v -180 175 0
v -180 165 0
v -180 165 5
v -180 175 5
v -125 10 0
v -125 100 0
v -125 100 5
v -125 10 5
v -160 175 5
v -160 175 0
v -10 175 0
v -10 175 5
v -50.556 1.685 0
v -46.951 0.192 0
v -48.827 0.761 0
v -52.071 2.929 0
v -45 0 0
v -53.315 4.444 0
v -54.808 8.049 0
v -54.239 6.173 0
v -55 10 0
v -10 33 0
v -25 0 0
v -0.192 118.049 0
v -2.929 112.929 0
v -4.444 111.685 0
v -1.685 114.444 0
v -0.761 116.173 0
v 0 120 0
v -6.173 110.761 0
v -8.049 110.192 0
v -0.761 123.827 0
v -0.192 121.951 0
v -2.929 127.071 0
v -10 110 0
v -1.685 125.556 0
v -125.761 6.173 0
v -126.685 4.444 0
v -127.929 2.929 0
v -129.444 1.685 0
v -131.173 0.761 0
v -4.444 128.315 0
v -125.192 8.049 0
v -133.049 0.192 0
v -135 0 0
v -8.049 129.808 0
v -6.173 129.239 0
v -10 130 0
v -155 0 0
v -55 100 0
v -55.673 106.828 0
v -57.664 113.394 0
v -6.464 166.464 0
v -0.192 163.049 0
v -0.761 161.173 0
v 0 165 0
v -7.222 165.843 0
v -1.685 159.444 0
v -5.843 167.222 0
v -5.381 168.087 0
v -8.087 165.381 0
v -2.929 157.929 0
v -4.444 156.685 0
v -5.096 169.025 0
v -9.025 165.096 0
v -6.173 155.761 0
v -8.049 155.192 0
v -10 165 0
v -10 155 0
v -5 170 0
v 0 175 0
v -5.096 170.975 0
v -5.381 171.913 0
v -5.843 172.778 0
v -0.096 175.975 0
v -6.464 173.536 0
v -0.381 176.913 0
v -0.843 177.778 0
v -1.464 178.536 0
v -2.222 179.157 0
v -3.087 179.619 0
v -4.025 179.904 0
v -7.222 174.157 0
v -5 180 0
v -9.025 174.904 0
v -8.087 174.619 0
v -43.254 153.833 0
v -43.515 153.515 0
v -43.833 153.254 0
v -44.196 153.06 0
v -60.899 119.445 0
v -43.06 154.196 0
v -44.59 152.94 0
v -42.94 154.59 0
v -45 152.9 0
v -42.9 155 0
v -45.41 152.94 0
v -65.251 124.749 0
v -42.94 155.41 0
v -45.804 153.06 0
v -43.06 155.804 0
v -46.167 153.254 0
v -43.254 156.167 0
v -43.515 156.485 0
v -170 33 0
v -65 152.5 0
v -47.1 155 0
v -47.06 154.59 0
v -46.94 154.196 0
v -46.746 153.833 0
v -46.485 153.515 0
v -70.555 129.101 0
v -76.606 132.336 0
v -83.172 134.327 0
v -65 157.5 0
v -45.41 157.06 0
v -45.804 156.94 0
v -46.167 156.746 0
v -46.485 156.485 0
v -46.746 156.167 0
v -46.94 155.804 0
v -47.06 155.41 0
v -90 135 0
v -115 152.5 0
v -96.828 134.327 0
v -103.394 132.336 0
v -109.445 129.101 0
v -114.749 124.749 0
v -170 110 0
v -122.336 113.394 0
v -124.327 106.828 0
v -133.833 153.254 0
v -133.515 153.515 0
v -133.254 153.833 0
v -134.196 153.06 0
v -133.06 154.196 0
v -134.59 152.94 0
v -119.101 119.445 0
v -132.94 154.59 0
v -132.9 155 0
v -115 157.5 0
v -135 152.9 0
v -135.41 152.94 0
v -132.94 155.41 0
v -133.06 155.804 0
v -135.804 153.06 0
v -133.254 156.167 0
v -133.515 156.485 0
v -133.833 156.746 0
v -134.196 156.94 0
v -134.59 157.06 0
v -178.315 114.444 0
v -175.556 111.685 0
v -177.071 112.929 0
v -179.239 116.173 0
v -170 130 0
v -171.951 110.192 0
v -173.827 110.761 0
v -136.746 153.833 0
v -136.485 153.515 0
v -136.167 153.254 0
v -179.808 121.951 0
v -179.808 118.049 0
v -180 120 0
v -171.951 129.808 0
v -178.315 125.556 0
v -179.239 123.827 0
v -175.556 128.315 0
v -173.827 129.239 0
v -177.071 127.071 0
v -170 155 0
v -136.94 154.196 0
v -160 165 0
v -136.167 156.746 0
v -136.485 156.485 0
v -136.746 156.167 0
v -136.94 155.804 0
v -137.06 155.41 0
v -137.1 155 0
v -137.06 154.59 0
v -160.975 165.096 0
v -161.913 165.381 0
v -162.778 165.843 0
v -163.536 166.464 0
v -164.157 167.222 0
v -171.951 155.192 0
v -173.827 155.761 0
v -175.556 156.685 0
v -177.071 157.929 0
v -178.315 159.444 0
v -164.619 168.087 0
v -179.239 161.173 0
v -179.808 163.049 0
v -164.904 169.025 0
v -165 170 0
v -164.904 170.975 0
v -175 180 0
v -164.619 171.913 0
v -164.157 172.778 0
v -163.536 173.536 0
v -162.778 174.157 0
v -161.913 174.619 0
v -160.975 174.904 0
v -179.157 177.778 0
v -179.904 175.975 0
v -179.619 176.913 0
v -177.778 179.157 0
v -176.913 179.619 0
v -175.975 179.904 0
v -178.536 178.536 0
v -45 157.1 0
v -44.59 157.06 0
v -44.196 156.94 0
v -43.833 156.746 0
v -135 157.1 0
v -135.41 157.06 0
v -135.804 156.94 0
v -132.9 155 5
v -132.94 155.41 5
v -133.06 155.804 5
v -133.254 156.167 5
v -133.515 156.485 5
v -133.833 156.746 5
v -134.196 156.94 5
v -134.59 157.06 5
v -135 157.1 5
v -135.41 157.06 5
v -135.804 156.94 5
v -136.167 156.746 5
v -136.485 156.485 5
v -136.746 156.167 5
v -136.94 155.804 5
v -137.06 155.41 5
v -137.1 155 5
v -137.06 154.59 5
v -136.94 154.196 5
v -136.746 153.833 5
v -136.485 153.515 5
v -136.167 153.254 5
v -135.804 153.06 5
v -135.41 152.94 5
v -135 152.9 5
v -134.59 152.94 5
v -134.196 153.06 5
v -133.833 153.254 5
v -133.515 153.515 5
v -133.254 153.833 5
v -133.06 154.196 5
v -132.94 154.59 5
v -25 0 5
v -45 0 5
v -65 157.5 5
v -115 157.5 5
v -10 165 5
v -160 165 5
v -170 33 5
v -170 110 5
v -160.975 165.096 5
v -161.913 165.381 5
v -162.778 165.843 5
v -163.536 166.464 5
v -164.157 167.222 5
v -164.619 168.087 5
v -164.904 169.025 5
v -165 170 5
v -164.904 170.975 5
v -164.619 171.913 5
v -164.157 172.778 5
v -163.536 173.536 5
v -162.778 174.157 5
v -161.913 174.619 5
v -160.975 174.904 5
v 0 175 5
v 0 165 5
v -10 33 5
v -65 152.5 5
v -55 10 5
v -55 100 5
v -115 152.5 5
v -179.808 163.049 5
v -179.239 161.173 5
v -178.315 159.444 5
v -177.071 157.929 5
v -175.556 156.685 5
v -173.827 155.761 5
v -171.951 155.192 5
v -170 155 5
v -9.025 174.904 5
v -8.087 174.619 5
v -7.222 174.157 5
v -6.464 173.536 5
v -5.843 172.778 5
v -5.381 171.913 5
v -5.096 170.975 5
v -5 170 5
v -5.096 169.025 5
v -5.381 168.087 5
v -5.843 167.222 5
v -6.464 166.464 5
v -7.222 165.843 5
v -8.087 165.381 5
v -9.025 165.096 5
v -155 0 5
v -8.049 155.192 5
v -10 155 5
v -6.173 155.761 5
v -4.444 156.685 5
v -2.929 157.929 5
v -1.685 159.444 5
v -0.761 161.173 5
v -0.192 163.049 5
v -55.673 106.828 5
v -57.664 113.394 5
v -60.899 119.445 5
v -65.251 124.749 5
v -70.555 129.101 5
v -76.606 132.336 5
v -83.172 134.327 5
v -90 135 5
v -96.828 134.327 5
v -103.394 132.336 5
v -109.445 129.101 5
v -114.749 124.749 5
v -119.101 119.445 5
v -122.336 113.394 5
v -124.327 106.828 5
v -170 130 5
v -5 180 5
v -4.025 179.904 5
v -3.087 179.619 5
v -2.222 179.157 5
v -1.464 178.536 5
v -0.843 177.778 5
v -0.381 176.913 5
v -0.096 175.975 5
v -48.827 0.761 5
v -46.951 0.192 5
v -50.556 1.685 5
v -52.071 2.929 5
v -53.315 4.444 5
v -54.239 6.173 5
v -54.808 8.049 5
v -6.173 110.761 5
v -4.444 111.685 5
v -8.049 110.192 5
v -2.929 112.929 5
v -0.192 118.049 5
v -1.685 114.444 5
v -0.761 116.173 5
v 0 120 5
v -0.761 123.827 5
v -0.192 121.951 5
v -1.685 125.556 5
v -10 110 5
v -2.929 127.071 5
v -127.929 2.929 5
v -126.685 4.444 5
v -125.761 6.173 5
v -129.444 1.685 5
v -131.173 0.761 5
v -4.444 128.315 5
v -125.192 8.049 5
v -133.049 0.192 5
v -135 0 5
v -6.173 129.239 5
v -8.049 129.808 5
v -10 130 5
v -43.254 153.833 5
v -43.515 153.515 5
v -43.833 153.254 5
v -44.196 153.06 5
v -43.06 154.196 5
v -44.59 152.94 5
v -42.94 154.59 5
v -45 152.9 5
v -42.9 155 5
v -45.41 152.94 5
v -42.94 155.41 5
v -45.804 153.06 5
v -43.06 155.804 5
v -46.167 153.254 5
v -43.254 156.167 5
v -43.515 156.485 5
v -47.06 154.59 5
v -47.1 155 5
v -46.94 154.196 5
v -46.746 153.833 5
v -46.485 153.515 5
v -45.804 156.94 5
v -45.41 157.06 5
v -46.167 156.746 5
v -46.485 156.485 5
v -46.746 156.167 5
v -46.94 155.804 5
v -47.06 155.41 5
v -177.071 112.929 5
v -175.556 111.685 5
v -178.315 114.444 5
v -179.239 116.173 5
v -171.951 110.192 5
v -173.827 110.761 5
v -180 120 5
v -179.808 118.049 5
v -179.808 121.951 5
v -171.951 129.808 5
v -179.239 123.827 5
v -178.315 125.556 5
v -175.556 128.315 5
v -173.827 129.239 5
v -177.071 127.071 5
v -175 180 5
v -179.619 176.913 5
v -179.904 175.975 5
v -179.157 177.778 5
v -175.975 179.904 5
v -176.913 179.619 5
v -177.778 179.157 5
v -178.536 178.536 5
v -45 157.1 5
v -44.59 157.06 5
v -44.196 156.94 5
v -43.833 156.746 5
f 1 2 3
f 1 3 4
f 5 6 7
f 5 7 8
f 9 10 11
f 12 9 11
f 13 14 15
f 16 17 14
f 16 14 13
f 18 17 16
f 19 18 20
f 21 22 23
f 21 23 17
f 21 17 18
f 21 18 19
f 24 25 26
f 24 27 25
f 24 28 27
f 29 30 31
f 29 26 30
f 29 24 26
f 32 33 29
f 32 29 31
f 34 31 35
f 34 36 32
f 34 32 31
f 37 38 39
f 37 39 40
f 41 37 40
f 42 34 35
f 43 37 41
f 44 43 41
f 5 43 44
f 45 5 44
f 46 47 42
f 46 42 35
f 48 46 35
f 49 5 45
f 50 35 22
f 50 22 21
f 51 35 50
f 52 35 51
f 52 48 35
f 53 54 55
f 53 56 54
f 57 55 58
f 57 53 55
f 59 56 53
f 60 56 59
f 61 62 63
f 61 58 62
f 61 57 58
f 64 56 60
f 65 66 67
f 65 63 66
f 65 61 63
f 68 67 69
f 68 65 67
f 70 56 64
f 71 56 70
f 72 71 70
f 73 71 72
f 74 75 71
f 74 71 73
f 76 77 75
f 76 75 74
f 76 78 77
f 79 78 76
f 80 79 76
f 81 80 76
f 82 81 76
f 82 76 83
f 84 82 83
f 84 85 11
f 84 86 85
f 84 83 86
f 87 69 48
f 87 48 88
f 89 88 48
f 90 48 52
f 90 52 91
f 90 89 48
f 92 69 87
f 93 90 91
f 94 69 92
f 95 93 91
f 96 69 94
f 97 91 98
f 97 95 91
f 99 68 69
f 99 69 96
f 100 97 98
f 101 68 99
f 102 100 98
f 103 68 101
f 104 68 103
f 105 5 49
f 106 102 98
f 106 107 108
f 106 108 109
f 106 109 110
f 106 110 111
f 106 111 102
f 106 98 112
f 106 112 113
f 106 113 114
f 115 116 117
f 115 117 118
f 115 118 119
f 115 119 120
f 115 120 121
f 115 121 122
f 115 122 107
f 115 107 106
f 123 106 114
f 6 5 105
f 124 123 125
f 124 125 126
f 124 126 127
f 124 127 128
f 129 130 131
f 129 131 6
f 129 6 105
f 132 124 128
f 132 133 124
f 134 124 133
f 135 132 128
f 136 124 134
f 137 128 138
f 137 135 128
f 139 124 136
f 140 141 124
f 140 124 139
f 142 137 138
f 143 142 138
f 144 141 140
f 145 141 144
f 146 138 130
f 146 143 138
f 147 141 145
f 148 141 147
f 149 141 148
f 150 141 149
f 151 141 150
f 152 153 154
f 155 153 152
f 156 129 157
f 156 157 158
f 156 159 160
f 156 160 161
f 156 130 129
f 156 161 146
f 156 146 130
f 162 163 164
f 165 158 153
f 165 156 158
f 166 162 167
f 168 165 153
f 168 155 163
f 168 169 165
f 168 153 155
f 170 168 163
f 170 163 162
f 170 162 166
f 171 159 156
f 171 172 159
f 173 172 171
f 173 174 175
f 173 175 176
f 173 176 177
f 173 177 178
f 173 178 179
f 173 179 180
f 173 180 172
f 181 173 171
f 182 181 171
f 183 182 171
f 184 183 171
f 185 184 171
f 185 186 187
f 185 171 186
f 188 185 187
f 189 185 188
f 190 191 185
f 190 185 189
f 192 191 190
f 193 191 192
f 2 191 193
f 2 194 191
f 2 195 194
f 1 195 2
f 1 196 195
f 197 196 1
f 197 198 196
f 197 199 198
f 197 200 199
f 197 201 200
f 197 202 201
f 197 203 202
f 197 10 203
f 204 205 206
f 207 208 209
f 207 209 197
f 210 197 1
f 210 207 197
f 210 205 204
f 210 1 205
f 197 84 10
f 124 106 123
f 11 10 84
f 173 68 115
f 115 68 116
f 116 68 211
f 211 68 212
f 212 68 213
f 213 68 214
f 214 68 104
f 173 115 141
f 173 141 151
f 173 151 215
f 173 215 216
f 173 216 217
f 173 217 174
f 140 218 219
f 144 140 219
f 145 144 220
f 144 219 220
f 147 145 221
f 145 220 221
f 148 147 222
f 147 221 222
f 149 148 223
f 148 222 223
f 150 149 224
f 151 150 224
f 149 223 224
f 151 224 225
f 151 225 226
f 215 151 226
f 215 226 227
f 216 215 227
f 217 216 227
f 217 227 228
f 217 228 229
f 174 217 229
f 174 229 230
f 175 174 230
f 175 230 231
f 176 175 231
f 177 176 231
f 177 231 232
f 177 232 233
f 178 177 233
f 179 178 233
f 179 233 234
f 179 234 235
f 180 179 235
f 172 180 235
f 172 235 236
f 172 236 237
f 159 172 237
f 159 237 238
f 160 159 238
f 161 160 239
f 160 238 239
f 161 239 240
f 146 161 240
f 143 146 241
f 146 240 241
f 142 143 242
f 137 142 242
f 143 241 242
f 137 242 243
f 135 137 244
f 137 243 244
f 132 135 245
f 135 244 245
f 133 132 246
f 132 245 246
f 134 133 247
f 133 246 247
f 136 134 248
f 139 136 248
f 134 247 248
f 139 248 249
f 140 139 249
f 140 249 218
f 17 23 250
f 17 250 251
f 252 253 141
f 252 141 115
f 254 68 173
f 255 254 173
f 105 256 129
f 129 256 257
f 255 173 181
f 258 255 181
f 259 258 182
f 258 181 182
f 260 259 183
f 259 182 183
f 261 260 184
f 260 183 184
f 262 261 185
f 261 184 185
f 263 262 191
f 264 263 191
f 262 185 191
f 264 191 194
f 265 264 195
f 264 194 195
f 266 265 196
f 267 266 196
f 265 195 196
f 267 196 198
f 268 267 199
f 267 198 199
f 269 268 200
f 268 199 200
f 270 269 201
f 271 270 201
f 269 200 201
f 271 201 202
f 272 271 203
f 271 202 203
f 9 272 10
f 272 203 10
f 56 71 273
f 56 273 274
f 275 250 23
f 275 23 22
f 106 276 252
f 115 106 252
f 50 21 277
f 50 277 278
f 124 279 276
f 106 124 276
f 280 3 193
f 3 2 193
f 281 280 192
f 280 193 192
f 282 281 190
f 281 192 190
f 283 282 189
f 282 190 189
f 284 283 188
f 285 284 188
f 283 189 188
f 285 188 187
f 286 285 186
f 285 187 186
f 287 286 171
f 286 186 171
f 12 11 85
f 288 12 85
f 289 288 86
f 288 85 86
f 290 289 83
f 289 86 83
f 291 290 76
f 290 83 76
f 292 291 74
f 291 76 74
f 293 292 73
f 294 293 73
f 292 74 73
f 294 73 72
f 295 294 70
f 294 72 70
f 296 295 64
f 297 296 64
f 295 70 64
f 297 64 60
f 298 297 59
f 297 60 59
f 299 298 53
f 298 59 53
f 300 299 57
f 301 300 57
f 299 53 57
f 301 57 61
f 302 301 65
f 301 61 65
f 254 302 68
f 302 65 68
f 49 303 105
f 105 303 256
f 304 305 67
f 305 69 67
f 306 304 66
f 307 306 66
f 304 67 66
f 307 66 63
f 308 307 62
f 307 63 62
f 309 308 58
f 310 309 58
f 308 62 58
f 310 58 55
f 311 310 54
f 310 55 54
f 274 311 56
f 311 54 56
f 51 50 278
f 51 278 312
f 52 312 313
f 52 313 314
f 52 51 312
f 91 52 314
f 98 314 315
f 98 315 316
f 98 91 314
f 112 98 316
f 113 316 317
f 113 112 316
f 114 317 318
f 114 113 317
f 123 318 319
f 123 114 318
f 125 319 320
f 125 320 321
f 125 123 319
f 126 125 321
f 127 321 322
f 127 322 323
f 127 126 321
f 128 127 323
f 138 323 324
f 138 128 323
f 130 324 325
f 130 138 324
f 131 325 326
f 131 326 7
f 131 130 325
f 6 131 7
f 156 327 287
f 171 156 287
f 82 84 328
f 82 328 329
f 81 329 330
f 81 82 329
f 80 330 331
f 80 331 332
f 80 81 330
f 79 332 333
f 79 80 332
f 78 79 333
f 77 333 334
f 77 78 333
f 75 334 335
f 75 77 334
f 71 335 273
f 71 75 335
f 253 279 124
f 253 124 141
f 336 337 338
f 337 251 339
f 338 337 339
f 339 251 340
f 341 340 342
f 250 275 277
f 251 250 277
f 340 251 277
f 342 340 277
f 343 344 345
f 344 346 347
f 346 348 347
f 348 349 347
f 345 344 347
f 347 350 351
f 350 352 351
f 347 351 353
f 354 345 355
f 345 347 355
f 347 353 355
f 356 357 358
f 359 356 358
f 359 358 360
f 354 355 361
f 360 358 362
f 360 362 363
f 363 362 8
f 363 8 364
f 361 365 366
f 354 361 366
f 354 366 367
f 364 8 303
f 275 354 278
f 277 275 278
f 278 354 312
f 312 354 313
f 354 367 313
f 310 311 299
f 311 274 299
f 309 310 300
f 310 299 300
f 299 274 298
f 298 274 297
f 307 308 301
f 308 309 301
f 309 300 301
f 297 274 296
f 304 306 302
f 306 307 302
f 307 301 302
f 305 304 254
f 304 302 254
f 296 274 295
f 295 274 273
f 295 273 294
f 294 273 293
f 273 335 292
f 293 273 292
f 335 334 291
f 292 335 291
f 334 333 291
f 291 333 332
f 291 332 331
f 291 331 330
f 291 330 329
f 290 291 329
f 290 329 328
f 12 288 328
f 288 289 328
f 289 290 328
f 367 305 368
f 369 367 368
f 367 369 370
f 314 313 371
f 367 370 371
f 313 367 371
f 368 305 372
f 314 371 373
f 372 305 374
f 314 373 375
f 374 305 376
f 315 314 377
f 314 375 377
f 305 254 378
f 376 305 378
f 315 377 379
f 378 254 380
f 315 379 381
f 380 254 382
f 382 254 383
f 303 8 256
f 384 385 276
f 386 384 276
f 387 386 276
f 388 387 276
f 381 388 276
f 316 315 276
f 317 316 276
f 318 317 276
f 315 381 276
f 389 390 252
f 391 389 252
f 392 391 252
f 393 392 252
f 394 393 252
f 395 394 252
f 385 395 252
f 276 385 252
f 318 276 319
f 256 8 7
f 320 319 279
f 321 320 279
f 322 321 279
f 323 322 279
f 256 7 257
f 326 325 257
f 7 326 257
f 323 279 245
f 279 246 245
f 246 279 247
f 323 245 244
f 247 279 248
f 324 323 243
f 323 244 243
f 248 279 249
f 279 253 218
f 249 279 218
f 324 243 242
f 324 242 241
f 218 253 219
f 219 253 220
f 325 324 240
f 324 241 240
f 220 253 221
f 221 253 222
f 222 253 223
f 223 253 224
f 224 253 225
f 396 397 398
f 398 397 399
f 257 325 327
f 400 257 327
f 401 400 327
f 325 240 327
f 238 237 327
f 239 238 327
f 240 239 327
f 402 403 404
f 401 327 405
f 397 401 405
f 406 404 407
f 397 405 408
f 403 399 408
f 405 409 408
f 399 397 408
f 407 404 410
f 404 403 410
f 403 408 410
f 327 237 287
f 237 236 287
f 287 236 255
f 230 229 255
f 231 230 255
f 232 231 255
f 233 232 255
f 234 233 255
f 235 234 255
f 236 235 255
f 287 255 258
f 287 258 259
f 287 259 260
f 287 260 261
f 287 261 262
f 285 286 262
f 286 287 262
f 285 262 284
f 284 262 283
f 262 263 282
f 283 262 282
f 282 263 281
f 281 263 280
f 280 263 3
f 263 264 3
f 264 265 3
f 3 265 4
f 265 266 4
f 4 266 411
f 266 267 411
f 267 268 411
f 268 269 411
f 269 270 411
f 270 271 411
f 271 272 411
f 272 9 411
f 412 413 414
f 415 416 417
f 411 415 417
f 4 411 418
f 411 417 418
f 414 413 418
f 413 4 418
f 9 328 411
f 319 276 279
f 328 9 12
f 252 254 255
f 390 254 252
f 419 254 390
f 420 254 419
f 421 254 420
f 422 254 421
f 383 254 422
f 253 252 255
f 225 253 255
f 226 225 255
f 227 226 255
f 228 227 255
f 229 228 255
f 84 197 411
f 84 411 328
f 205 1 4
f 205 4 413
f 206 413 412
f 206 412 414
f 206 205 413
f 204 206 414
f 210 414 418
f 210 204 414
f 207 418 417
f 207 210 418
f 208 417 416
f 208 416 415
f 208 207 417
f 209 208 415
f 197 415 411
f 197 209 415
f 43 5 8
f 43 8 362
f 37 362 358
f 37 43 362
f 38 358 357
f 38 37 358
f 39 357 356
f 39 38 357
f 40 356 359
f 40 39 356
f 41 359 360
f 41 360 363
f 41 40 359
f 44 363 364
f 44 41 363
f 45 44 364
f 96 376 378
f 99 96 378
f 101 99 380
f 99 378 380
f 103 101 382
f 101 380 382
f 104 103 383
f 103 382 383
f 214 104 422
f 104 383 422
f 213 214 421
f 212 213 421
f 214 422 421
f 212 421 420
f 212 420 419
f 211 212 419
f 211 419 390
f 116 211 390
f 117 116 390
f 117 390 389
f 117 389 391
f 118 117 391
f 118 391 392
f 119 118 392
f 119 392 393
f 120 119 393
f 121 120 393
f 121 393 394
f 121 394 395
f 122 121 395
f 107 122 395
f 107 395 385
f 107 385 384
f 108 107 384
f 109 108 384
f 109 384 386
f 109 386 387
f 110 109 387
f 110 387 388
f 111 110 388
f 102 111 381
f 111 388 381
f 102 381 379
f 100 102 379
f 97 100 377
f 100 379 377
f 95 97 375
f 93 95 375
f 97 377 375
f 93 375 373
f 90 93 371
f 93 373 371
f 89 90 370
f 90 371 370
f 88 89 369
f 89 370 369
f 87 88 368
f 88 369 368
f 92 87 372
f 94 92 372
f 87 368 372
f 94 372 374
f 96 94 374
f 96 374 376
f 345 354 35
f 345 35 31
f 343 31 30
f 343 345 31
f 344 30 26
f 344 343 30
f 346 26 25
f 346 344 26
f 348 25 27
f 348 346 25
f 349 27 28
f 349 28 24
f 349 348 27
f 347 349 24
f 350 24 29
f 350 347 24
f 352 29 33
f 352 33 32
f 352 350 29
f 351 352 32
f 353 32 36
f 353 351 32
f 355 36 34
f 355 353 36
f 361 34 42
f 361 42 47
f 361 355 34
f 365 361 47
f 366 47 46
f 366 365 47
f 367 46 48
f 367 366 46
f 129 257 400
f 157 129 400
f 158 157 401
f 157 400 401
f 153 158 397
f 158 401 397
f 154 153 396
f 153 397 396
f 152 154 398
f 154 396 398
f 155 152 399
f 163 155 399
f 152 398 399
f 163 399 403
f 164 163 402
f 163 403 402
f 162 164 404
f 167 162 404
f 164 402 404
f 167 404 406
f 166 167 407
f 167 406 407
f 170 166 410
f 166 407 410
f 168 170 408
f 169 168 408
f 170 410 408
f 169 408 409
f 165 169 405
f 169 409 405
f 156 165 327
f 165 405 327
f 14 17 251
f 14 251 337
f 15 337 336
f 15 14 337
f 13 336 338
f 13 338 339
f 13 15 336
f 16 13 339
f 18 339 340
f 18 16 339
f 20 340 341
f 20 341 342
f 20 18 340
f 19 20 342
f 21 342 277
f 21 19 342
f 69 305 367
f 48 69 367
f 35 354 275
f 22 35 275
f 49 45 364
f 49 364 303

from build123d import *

# Parameters (mm, degrees)
BOSS_EXTRUDE1_DEPTH = 5
SKETCH2_R           = 2.1
SKETCH2_W           = 50
SKETCH2_H           = 5
CUT_EXTRUDE1_DEPTH  = 10
CUT_EXTRUDE2_DEPTH  = 10
CUT_EXTRUDE3_DEPTH  = 10
FILLET1_R           = 10
BOSS_EXTRUDE2_DEPTH = 5


with BuildPart() as part:
    # Sketch1 → Boss-Extrude1 (new body)
    with BuildSketch(Plane.XY):
        with BuildLine():
            Line((-10, 0), (-45, 0))
            ThreePointArc((-45, 0), (-52.071067812, 2.928932188), (-55, 10))
            Line((-55, 10), (-55, 100))
            ThreePointArc((-55, 100), (-90, 135), (-125, 100))
            Line((-125, 100), (-125, 10))
            ThreePointArc((-125, 10), (-127.928932188, 2.928932188), (-135, 0))
            Line((-135, 0), (-170, 0))
            ThreePointArc((-170, 0), (-177.071067812, 2.928932188), (-180, 10))
            Line((-180, 10), (-180, 175))
            ThreePointArc((-180, 175), (-178.535533906, 178.535533906), (-175, 180))
            Line((-175, 180), (-5, 180))
            ThreePointArc((-5, 180), (-1.464466094, 178.535533906), (0, 175))
            Line((0, 175), (0, 10))
            ThreePointArc((0, 10), (-2.928932188, 2.928932188), (-10, 0))
        make_face()
        with BuildLine():
            Line((-160, 175), (-10, 175))
            ThreePointArc((-10, 175), (-5, 170), (-10, 165))
            Line((-10, 165), (-160, 165))
            ThreePointArc((-160, 165), (-165, 170), (-160, 175))
        make_face(mode=Mode.SUBTRACT)
    extrude(amount=BOSS_EXTRUDE1_DEPTH)

    # Sketch2 → Cut-Extrude1 (cut)
    with BuildSketch(Plane.XY.offset(5)):
        with Locations((-135, 155)):
            Circle(SKETCH2_R)
        with Locations((-45, 155)):
            Circle(SKETCH2_R)
        with Locations((-90, 155)):
            Rectangle(SKETCH2_W, SKETCH2_H)
    extrude(amount=-CUT_EXTRUDE1_DEPTH, mode=Mode.SUBTRACT)

    # Sketch3 → Cut-Extrude2 (cut)
    with BuildSketch(Plane.XY.offset(5)):
        Polygon((0, 55), (0, 0), (-25, 0), align=None)
        Polygon((-155, 0), (-180, 55), (-180, 0), align=None)
    extrude(amount=-CUT_EXTRUDE2_DEPTH, mode=Mode.SUBTRACT)

    # Sketch4 → Cut-Extrude3 (cut)
    with BuildSketch(Plane.XY.offset(5)):
        Polygon((0, 155), (-10, 155), (-10, 33), (0, 55), align=None)
        Polygon((-180, 55), (-170, 33), (-170, 155), (-180, 155), align=None)
    extrude(amount=-CUT_EXTRUDE3_DEPTH, mode=Mode.SUBTRACT)

    # Fillet1
    fillet1_edges = [part.edges().sort_by_distance(p)[0] for p in [
        (0, 155, 2.5),
        (-180, 155, 2.5),
    ]]
    fillet(fillet1_edges, radius=FILLET1_R - 0.0001)  # a hair under: the kernel refuses the full size

    # Sketch5 → Boss-Extrude2 (add)
    with BuildSketch(Plane.XY.offset(5)):
        with BuildLine():
            Line((-10, 130), (-10, 110))
            ThreePointArc((-10, 110), (0, 120), (-10, 130))
        make_face()
    boss_extrude2 = extrude(amount=-BOSS_EXTRUDE2_DEPTH)

    # Mirror1: Boss-Extrude2 across plane
    add(boss_extrude2.mirror(Plane(origin=(-90, 0, 0), x_dir=(0, 0, 1), z_dir=(1, 0, 0))))


solid = part.part
